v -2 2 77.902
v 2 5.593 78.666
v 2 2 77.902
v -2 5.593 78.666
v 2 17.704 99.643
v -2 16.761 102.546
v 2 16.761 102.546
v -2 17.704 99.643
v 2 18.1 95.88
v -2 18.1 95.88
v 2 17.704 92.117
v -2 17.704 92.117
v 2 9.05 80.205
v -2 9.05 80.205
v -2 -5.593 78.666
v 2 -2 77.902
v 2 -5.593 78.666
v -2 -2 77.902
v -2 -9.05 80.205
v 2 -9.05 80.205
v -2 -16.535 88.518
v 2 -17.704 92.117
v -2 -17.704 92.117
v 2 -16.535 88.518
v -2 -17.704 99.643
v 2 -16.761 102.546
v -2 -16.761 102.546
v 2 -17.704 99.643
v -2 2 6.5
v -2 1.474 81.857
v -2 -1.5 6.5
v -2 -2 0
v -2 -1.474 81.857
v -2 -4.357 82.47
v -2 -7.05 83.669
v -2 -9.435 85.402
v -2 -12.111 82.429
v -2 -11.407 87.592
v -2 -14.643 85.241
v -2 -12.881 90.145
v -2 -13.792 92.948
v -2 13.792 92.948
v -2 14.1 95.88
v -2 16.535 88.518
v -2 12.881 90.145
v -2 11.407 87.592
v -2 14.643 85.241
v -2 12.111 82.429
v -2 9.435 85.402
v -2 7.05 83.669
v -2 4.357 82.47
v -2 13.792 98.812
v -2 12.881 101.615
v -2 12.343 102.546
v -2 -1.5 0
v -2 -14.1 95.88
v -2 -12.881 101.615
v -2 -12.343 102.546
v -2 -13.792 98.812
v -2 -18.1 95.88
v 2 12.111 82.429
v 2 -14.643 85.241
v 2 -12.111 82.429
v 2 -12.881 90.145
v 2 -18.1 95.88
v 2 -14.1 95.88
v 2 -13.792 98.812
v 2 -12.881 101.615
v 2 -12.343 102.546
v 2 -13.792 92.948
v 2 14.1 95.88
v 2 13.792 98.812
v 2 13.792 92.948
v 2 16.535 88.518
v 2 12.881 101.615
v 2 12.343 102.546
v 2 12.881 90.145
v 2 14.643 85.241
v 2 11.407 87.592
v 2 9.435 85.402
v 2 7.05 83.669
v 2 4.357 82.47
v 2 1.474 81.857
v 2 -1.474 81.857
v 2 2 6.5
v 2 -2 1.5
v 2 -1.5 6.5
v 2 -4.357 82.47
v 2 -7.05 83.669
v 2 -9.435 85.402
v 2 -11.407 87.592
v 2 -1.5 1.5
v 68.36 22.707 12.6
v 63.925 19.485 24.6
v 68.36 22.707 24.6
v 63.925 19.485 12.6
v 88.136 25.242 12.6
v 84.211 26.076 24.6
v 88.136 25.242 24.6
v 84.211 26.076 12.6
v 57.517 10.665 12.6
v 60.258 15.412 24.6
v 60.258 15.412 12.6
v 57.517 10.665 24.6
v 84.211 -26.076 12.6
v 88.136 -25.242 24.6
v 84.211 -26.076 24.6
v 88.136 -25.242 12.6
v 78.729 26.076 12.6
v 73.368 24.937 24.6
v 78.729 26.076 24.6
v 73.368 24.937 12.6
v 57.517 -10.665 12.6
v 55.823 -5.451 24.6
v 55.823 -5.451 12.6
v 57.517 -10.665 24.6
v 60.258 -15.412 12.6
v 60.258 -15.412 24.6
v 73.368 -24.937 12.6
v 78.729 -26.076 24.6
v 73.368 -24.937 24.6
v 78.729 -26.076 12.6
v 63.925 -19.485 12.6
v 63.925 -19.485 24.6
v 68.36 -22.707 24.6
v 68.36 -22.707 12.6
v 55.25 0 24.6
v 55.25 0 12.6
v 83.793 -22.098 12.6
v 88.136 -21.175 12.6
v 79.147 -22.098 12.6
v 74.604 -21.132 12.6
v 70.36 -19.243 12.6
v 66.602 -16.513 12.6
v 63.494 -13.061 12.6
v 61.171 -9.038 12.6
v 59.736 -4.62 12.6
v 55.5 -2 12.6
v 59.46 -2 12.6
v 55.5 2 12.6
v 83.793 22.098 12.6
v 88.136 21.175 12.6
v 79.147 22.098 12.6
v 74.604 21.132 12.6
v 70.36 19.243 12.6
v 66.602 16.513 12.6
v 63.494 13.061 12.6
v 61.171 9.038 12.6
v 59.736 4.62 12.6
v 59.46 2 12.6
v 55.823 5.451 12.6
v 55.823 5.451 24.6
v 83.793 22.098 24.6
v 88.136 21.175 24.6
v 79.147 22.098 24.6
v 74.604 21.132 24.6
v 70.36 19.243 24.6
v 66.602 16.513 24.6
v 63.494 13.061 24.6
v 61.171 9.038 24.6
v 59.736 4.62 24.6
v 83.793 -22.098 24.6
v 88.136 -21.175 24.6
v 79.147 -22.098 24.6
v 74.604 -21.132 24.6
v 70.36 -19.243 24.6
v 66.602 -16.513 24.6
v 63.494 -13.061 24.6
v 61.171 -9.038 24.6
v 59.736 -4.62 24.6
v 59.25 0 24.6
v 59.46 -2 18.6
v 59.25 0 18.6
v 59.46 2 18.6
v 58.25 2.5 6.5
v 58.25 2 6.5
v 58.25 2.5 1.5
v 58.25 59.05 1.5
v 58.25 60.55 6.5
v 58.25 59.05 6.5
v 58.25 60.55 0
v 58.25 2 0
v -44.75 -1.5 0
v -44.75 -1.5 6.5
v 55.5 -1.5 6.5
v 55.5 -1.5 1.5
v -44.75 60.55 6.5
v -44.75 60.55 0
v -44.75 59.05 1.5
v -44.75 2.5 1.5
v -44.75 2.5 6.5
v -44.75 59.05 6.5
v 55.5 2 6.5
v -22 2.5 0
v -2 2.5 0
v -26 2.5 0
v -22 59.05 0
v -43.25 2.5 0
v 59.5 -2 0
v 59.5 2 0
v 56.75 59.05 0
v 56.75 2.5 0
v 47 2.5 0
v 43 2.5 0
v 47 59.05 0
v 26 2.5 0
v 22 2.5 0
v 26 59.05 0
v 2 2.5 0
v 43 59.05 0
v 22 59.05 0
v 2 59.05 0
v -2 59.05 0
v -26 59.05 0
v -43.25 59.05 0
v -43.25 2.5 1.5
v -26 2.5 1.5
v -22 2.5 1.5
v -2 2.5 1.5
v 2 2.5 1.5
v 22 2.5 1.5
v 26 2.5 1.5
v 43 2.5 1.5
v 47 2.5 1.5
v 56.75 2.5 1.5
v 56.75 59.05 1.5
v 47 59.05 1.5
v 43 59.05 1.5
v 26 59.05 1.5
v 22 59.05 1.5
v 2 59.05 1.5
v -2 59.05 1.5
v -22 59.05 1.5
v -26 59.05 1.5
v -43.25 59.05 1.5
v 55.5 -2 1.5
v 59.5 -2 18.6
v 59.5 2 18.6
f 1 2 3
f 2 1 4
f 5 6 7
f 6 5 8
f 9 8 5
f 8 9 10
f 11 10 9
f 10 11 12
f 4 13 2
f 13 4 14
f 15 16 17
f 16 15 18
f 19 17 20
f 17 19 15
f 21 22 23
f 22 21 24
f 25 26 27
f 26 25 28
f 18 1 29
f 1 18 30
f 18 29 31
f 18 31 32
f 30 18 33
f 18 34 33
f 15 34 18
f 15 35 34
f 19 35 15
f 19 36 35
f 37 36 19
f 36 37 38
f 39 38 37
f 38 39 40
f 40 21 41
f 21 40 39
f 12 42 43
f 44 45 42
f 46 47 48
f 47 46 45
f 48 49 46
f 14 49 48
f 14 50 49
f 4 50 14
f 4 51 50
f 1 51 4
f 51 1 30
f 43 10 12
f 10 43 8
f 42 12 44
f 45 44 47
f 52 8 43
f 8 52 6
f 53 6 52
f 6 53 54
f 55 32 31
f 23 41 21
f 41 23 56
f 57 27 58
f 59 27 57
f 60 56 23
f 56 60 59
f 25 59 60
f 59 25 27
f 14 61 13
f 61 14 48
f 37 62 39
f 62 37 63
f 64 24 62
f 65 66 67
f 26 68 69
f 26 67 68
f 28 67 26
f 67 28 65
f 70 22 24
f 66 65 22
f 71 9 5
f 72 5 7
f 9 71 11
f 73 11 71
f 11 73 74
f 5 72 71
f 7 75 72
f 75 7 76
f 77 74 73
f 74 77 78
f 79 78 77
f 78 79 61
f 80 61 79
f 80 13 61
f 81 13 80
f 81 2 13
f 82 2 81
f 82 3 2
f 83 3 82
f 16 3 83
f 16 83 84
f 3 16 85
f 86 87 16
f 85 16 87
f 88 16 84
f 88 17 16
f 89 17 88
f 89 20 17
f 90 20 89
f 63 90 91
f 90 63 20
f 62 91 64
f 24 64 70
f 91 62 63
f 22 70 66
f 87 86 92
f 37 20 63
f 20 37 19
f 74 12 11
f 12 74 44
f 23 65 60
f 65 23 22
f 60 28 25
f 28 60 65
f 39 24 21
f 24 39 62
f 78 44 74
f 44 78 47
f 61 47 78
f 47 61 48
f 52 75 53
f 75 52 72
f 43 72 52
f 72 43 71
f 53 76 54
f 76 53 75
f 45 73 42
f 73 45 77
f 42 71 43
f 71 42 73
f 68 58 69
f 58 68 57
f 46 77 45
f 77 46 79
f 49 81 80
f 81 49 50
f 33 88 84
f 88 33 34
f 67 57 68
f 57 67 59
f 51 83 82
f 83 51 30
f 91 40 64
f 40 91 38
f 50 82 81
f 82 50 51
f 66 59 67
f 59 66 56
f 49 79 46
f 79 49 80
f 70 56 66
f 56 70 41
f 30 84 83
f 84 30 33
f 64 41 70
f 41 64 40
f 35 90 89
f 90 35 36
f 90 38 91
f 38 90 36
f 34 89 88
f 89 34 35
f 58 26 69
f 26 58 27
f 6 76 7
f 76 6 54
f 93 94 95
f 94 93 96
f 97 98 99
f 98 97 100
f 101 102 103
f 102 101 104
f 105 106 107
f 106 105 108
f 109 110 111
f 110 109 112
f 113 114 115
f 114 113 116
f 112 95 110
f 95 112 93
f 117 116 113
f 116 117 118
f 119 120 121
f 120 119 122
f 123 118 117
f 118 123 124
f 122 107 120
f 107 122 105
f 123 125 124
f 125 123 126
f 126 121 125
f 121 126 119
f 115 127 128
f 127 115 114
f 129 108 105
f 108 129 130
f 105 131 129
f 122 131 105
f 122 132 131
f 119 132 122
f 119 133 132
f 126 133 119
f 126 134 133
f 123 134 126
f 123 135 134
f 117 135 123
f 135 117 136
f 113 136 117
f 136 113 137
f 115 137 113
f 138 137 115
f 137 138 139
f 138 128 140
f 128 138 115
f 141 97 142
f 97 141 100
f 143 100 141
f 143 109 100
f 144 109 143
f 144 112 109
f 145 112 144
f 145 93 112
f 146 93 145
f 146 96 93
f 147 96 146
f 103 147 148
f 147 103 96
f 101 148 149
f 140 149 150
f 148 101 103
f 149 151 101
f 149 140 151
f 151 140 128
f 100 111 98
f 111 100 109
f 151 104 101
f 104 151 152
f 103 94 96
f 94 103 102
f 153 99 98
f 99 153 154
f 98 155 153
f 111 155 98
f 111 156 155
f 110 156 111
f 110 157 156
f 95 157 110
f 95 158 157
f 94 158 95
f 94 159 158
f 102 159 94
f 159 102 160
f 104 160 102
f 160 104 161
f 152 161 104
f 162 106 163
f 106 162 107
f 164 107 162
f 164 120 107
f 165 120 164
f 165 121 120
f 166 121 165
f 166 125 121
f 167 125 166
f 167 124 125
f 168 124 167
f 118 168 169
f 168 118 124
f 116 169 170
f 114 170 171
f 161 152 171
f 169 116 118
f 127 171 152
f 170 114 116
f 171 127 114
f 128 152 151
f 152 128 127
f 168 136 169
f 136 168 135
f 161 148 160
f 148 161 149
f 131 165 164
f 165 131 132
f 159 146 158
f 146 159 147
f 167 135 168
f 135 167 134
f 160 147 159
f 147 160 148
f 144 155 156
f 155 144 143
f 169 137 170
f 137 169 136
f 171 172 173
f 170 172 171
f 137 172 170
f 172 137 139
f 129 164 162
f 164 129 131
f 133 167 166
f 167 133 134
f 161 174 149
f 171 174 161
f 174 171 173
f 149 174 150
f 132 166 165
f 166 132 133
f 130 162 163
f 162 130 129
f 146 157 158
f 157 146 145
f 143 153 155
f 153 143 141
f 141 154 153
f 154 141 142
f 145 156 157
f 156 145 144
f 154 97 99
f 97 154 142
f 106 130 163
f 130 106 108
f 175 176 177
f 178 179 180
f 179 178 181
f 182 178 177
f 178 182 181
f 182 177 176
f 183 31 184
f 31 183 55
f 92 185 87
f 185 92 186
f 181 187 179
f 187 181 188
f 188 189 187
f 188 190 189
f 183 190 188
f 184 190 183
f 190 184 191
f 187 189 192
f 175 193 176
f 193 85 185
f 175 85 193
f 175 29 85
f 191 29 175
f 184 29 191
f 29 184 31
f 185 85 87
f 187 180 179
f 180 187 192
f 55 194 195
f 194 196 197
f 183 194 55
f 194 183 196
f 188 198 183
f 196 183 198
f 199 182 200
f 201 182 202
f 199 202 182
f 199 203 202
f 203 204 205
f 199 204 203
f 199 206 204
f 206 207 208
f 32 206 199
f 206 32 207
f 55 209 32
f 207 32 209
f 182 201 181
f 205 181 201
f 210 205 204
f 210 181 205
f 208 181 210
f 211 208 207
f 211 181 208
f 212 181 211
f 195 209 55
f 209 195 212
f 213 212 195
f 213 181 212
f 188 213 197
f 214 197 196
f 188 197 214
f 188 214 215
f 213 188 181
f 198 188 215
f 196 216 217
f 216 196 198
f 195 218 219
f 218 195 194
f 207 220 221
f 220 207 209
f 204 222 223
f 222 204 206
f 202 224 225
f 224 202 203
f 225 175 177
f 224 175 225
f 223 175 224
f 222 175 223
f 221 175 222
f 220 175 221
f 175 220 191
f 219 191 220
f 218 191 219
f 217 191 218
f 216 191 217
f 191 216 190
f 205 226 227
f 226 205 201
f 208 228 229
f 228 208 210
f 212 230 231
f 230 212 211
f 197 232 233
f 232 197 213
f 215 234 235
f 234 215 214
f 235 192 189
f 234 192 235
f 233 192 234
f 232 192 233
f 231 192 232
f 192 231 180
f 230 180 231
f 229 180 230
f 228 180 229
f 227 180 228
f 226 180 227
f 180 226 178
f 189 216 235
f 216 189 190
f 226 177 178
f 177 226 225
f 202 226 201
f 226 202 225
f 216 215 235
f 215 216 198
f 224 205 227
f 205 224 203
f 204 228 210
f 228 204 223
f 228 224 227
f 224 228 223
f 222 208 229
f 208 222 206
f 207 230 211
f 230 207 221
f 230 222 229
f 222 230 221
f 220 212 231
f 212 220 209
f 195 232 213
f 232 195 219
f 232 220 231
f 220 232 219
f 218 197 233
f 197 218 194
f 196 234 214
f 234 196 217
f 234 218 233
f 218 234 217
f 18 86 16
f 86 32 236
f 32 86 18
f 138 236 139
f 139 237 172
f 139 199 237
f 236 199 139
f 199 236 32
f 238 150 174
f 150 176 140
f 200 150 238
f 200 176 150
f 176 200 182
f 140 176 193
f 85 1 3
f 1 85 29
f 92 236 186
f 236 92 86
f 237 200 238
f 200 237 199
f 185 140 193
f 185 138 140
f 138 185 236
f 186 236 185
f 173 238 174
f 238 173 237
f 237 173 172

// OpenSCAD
use <MCAD/regular_shapes.scad>

cr_from_wall = 95.88;
cr_rad = 28.2/2;
t = 1.5;
w = 4;

box = [56, 5, 56.55];
overhang_x = 100 - box.x;
skirt_t = 12.6;
cr_mount_rad = 44.44/2;

rotate([90, 0, 0])
{ // rotate for printing

translate([0, cr_from_wall, 0])
rotate([0, 90, 0])
difference(){
    cylinder_tube(w, cr_rad + w, w, center=true);
    R1 = cr_rad * 10;
    translate([0, R1/2 + cr_mount_rad * 0.3, 0])
    cube([R1, R1, R1], center=true);
}


cr_arm_l = cr_from_wall - cr_rad;
translate([0, cr_arm_l/2, 0])
cube([w, cr_arm_l, w], center=true);

translate([t/2, 0, -w/2])
cube([box.x, t, w]);

cr_mount_w = 3*w;
sk_arm_l = skirt_t + cr_mount_w/2;
translate([box.x + t, sk_arm_l/2, 0])
cube([w, sk_arm_l, w], center=true);

R = cr_mount_rad * 10;
translate([box.x + w -t/2 + cr_mount_rad, sk_arm_l, 0])
rotate([90, 0, 0])
difference(){
    cylinder_tube(cr_mount_w, cr_mount_rad + w, w, center=true);
    translate([R/2 + cr_mount_rad * 0.3, 0])
    cube([R, R, R], center=true);
}

translate([(box.x + t - overhang_x)/2, (box.y + t)/2, -(box.z + w - t) / 2])
difference(){
    cube([box.x + 2*t + overhang_x, box.y + t, box.z + t + w], center=true);
    translate([0, t/2, (t - w)/2])
    cube([box.x * 2 + overhang_x, box.y, box.z], center=true);
    translate([0, t/2, (t - w)/2])
    cube([box.x + overhang_x, box.y*2, box.z], center=true);
}

for (d = [45, 24, 0, -24]){
    translate([d, t/2, -box.z/2 - (w + t)/2])
    cube([w, t, box.z + t], center=true);
}

} // rotate for printing
